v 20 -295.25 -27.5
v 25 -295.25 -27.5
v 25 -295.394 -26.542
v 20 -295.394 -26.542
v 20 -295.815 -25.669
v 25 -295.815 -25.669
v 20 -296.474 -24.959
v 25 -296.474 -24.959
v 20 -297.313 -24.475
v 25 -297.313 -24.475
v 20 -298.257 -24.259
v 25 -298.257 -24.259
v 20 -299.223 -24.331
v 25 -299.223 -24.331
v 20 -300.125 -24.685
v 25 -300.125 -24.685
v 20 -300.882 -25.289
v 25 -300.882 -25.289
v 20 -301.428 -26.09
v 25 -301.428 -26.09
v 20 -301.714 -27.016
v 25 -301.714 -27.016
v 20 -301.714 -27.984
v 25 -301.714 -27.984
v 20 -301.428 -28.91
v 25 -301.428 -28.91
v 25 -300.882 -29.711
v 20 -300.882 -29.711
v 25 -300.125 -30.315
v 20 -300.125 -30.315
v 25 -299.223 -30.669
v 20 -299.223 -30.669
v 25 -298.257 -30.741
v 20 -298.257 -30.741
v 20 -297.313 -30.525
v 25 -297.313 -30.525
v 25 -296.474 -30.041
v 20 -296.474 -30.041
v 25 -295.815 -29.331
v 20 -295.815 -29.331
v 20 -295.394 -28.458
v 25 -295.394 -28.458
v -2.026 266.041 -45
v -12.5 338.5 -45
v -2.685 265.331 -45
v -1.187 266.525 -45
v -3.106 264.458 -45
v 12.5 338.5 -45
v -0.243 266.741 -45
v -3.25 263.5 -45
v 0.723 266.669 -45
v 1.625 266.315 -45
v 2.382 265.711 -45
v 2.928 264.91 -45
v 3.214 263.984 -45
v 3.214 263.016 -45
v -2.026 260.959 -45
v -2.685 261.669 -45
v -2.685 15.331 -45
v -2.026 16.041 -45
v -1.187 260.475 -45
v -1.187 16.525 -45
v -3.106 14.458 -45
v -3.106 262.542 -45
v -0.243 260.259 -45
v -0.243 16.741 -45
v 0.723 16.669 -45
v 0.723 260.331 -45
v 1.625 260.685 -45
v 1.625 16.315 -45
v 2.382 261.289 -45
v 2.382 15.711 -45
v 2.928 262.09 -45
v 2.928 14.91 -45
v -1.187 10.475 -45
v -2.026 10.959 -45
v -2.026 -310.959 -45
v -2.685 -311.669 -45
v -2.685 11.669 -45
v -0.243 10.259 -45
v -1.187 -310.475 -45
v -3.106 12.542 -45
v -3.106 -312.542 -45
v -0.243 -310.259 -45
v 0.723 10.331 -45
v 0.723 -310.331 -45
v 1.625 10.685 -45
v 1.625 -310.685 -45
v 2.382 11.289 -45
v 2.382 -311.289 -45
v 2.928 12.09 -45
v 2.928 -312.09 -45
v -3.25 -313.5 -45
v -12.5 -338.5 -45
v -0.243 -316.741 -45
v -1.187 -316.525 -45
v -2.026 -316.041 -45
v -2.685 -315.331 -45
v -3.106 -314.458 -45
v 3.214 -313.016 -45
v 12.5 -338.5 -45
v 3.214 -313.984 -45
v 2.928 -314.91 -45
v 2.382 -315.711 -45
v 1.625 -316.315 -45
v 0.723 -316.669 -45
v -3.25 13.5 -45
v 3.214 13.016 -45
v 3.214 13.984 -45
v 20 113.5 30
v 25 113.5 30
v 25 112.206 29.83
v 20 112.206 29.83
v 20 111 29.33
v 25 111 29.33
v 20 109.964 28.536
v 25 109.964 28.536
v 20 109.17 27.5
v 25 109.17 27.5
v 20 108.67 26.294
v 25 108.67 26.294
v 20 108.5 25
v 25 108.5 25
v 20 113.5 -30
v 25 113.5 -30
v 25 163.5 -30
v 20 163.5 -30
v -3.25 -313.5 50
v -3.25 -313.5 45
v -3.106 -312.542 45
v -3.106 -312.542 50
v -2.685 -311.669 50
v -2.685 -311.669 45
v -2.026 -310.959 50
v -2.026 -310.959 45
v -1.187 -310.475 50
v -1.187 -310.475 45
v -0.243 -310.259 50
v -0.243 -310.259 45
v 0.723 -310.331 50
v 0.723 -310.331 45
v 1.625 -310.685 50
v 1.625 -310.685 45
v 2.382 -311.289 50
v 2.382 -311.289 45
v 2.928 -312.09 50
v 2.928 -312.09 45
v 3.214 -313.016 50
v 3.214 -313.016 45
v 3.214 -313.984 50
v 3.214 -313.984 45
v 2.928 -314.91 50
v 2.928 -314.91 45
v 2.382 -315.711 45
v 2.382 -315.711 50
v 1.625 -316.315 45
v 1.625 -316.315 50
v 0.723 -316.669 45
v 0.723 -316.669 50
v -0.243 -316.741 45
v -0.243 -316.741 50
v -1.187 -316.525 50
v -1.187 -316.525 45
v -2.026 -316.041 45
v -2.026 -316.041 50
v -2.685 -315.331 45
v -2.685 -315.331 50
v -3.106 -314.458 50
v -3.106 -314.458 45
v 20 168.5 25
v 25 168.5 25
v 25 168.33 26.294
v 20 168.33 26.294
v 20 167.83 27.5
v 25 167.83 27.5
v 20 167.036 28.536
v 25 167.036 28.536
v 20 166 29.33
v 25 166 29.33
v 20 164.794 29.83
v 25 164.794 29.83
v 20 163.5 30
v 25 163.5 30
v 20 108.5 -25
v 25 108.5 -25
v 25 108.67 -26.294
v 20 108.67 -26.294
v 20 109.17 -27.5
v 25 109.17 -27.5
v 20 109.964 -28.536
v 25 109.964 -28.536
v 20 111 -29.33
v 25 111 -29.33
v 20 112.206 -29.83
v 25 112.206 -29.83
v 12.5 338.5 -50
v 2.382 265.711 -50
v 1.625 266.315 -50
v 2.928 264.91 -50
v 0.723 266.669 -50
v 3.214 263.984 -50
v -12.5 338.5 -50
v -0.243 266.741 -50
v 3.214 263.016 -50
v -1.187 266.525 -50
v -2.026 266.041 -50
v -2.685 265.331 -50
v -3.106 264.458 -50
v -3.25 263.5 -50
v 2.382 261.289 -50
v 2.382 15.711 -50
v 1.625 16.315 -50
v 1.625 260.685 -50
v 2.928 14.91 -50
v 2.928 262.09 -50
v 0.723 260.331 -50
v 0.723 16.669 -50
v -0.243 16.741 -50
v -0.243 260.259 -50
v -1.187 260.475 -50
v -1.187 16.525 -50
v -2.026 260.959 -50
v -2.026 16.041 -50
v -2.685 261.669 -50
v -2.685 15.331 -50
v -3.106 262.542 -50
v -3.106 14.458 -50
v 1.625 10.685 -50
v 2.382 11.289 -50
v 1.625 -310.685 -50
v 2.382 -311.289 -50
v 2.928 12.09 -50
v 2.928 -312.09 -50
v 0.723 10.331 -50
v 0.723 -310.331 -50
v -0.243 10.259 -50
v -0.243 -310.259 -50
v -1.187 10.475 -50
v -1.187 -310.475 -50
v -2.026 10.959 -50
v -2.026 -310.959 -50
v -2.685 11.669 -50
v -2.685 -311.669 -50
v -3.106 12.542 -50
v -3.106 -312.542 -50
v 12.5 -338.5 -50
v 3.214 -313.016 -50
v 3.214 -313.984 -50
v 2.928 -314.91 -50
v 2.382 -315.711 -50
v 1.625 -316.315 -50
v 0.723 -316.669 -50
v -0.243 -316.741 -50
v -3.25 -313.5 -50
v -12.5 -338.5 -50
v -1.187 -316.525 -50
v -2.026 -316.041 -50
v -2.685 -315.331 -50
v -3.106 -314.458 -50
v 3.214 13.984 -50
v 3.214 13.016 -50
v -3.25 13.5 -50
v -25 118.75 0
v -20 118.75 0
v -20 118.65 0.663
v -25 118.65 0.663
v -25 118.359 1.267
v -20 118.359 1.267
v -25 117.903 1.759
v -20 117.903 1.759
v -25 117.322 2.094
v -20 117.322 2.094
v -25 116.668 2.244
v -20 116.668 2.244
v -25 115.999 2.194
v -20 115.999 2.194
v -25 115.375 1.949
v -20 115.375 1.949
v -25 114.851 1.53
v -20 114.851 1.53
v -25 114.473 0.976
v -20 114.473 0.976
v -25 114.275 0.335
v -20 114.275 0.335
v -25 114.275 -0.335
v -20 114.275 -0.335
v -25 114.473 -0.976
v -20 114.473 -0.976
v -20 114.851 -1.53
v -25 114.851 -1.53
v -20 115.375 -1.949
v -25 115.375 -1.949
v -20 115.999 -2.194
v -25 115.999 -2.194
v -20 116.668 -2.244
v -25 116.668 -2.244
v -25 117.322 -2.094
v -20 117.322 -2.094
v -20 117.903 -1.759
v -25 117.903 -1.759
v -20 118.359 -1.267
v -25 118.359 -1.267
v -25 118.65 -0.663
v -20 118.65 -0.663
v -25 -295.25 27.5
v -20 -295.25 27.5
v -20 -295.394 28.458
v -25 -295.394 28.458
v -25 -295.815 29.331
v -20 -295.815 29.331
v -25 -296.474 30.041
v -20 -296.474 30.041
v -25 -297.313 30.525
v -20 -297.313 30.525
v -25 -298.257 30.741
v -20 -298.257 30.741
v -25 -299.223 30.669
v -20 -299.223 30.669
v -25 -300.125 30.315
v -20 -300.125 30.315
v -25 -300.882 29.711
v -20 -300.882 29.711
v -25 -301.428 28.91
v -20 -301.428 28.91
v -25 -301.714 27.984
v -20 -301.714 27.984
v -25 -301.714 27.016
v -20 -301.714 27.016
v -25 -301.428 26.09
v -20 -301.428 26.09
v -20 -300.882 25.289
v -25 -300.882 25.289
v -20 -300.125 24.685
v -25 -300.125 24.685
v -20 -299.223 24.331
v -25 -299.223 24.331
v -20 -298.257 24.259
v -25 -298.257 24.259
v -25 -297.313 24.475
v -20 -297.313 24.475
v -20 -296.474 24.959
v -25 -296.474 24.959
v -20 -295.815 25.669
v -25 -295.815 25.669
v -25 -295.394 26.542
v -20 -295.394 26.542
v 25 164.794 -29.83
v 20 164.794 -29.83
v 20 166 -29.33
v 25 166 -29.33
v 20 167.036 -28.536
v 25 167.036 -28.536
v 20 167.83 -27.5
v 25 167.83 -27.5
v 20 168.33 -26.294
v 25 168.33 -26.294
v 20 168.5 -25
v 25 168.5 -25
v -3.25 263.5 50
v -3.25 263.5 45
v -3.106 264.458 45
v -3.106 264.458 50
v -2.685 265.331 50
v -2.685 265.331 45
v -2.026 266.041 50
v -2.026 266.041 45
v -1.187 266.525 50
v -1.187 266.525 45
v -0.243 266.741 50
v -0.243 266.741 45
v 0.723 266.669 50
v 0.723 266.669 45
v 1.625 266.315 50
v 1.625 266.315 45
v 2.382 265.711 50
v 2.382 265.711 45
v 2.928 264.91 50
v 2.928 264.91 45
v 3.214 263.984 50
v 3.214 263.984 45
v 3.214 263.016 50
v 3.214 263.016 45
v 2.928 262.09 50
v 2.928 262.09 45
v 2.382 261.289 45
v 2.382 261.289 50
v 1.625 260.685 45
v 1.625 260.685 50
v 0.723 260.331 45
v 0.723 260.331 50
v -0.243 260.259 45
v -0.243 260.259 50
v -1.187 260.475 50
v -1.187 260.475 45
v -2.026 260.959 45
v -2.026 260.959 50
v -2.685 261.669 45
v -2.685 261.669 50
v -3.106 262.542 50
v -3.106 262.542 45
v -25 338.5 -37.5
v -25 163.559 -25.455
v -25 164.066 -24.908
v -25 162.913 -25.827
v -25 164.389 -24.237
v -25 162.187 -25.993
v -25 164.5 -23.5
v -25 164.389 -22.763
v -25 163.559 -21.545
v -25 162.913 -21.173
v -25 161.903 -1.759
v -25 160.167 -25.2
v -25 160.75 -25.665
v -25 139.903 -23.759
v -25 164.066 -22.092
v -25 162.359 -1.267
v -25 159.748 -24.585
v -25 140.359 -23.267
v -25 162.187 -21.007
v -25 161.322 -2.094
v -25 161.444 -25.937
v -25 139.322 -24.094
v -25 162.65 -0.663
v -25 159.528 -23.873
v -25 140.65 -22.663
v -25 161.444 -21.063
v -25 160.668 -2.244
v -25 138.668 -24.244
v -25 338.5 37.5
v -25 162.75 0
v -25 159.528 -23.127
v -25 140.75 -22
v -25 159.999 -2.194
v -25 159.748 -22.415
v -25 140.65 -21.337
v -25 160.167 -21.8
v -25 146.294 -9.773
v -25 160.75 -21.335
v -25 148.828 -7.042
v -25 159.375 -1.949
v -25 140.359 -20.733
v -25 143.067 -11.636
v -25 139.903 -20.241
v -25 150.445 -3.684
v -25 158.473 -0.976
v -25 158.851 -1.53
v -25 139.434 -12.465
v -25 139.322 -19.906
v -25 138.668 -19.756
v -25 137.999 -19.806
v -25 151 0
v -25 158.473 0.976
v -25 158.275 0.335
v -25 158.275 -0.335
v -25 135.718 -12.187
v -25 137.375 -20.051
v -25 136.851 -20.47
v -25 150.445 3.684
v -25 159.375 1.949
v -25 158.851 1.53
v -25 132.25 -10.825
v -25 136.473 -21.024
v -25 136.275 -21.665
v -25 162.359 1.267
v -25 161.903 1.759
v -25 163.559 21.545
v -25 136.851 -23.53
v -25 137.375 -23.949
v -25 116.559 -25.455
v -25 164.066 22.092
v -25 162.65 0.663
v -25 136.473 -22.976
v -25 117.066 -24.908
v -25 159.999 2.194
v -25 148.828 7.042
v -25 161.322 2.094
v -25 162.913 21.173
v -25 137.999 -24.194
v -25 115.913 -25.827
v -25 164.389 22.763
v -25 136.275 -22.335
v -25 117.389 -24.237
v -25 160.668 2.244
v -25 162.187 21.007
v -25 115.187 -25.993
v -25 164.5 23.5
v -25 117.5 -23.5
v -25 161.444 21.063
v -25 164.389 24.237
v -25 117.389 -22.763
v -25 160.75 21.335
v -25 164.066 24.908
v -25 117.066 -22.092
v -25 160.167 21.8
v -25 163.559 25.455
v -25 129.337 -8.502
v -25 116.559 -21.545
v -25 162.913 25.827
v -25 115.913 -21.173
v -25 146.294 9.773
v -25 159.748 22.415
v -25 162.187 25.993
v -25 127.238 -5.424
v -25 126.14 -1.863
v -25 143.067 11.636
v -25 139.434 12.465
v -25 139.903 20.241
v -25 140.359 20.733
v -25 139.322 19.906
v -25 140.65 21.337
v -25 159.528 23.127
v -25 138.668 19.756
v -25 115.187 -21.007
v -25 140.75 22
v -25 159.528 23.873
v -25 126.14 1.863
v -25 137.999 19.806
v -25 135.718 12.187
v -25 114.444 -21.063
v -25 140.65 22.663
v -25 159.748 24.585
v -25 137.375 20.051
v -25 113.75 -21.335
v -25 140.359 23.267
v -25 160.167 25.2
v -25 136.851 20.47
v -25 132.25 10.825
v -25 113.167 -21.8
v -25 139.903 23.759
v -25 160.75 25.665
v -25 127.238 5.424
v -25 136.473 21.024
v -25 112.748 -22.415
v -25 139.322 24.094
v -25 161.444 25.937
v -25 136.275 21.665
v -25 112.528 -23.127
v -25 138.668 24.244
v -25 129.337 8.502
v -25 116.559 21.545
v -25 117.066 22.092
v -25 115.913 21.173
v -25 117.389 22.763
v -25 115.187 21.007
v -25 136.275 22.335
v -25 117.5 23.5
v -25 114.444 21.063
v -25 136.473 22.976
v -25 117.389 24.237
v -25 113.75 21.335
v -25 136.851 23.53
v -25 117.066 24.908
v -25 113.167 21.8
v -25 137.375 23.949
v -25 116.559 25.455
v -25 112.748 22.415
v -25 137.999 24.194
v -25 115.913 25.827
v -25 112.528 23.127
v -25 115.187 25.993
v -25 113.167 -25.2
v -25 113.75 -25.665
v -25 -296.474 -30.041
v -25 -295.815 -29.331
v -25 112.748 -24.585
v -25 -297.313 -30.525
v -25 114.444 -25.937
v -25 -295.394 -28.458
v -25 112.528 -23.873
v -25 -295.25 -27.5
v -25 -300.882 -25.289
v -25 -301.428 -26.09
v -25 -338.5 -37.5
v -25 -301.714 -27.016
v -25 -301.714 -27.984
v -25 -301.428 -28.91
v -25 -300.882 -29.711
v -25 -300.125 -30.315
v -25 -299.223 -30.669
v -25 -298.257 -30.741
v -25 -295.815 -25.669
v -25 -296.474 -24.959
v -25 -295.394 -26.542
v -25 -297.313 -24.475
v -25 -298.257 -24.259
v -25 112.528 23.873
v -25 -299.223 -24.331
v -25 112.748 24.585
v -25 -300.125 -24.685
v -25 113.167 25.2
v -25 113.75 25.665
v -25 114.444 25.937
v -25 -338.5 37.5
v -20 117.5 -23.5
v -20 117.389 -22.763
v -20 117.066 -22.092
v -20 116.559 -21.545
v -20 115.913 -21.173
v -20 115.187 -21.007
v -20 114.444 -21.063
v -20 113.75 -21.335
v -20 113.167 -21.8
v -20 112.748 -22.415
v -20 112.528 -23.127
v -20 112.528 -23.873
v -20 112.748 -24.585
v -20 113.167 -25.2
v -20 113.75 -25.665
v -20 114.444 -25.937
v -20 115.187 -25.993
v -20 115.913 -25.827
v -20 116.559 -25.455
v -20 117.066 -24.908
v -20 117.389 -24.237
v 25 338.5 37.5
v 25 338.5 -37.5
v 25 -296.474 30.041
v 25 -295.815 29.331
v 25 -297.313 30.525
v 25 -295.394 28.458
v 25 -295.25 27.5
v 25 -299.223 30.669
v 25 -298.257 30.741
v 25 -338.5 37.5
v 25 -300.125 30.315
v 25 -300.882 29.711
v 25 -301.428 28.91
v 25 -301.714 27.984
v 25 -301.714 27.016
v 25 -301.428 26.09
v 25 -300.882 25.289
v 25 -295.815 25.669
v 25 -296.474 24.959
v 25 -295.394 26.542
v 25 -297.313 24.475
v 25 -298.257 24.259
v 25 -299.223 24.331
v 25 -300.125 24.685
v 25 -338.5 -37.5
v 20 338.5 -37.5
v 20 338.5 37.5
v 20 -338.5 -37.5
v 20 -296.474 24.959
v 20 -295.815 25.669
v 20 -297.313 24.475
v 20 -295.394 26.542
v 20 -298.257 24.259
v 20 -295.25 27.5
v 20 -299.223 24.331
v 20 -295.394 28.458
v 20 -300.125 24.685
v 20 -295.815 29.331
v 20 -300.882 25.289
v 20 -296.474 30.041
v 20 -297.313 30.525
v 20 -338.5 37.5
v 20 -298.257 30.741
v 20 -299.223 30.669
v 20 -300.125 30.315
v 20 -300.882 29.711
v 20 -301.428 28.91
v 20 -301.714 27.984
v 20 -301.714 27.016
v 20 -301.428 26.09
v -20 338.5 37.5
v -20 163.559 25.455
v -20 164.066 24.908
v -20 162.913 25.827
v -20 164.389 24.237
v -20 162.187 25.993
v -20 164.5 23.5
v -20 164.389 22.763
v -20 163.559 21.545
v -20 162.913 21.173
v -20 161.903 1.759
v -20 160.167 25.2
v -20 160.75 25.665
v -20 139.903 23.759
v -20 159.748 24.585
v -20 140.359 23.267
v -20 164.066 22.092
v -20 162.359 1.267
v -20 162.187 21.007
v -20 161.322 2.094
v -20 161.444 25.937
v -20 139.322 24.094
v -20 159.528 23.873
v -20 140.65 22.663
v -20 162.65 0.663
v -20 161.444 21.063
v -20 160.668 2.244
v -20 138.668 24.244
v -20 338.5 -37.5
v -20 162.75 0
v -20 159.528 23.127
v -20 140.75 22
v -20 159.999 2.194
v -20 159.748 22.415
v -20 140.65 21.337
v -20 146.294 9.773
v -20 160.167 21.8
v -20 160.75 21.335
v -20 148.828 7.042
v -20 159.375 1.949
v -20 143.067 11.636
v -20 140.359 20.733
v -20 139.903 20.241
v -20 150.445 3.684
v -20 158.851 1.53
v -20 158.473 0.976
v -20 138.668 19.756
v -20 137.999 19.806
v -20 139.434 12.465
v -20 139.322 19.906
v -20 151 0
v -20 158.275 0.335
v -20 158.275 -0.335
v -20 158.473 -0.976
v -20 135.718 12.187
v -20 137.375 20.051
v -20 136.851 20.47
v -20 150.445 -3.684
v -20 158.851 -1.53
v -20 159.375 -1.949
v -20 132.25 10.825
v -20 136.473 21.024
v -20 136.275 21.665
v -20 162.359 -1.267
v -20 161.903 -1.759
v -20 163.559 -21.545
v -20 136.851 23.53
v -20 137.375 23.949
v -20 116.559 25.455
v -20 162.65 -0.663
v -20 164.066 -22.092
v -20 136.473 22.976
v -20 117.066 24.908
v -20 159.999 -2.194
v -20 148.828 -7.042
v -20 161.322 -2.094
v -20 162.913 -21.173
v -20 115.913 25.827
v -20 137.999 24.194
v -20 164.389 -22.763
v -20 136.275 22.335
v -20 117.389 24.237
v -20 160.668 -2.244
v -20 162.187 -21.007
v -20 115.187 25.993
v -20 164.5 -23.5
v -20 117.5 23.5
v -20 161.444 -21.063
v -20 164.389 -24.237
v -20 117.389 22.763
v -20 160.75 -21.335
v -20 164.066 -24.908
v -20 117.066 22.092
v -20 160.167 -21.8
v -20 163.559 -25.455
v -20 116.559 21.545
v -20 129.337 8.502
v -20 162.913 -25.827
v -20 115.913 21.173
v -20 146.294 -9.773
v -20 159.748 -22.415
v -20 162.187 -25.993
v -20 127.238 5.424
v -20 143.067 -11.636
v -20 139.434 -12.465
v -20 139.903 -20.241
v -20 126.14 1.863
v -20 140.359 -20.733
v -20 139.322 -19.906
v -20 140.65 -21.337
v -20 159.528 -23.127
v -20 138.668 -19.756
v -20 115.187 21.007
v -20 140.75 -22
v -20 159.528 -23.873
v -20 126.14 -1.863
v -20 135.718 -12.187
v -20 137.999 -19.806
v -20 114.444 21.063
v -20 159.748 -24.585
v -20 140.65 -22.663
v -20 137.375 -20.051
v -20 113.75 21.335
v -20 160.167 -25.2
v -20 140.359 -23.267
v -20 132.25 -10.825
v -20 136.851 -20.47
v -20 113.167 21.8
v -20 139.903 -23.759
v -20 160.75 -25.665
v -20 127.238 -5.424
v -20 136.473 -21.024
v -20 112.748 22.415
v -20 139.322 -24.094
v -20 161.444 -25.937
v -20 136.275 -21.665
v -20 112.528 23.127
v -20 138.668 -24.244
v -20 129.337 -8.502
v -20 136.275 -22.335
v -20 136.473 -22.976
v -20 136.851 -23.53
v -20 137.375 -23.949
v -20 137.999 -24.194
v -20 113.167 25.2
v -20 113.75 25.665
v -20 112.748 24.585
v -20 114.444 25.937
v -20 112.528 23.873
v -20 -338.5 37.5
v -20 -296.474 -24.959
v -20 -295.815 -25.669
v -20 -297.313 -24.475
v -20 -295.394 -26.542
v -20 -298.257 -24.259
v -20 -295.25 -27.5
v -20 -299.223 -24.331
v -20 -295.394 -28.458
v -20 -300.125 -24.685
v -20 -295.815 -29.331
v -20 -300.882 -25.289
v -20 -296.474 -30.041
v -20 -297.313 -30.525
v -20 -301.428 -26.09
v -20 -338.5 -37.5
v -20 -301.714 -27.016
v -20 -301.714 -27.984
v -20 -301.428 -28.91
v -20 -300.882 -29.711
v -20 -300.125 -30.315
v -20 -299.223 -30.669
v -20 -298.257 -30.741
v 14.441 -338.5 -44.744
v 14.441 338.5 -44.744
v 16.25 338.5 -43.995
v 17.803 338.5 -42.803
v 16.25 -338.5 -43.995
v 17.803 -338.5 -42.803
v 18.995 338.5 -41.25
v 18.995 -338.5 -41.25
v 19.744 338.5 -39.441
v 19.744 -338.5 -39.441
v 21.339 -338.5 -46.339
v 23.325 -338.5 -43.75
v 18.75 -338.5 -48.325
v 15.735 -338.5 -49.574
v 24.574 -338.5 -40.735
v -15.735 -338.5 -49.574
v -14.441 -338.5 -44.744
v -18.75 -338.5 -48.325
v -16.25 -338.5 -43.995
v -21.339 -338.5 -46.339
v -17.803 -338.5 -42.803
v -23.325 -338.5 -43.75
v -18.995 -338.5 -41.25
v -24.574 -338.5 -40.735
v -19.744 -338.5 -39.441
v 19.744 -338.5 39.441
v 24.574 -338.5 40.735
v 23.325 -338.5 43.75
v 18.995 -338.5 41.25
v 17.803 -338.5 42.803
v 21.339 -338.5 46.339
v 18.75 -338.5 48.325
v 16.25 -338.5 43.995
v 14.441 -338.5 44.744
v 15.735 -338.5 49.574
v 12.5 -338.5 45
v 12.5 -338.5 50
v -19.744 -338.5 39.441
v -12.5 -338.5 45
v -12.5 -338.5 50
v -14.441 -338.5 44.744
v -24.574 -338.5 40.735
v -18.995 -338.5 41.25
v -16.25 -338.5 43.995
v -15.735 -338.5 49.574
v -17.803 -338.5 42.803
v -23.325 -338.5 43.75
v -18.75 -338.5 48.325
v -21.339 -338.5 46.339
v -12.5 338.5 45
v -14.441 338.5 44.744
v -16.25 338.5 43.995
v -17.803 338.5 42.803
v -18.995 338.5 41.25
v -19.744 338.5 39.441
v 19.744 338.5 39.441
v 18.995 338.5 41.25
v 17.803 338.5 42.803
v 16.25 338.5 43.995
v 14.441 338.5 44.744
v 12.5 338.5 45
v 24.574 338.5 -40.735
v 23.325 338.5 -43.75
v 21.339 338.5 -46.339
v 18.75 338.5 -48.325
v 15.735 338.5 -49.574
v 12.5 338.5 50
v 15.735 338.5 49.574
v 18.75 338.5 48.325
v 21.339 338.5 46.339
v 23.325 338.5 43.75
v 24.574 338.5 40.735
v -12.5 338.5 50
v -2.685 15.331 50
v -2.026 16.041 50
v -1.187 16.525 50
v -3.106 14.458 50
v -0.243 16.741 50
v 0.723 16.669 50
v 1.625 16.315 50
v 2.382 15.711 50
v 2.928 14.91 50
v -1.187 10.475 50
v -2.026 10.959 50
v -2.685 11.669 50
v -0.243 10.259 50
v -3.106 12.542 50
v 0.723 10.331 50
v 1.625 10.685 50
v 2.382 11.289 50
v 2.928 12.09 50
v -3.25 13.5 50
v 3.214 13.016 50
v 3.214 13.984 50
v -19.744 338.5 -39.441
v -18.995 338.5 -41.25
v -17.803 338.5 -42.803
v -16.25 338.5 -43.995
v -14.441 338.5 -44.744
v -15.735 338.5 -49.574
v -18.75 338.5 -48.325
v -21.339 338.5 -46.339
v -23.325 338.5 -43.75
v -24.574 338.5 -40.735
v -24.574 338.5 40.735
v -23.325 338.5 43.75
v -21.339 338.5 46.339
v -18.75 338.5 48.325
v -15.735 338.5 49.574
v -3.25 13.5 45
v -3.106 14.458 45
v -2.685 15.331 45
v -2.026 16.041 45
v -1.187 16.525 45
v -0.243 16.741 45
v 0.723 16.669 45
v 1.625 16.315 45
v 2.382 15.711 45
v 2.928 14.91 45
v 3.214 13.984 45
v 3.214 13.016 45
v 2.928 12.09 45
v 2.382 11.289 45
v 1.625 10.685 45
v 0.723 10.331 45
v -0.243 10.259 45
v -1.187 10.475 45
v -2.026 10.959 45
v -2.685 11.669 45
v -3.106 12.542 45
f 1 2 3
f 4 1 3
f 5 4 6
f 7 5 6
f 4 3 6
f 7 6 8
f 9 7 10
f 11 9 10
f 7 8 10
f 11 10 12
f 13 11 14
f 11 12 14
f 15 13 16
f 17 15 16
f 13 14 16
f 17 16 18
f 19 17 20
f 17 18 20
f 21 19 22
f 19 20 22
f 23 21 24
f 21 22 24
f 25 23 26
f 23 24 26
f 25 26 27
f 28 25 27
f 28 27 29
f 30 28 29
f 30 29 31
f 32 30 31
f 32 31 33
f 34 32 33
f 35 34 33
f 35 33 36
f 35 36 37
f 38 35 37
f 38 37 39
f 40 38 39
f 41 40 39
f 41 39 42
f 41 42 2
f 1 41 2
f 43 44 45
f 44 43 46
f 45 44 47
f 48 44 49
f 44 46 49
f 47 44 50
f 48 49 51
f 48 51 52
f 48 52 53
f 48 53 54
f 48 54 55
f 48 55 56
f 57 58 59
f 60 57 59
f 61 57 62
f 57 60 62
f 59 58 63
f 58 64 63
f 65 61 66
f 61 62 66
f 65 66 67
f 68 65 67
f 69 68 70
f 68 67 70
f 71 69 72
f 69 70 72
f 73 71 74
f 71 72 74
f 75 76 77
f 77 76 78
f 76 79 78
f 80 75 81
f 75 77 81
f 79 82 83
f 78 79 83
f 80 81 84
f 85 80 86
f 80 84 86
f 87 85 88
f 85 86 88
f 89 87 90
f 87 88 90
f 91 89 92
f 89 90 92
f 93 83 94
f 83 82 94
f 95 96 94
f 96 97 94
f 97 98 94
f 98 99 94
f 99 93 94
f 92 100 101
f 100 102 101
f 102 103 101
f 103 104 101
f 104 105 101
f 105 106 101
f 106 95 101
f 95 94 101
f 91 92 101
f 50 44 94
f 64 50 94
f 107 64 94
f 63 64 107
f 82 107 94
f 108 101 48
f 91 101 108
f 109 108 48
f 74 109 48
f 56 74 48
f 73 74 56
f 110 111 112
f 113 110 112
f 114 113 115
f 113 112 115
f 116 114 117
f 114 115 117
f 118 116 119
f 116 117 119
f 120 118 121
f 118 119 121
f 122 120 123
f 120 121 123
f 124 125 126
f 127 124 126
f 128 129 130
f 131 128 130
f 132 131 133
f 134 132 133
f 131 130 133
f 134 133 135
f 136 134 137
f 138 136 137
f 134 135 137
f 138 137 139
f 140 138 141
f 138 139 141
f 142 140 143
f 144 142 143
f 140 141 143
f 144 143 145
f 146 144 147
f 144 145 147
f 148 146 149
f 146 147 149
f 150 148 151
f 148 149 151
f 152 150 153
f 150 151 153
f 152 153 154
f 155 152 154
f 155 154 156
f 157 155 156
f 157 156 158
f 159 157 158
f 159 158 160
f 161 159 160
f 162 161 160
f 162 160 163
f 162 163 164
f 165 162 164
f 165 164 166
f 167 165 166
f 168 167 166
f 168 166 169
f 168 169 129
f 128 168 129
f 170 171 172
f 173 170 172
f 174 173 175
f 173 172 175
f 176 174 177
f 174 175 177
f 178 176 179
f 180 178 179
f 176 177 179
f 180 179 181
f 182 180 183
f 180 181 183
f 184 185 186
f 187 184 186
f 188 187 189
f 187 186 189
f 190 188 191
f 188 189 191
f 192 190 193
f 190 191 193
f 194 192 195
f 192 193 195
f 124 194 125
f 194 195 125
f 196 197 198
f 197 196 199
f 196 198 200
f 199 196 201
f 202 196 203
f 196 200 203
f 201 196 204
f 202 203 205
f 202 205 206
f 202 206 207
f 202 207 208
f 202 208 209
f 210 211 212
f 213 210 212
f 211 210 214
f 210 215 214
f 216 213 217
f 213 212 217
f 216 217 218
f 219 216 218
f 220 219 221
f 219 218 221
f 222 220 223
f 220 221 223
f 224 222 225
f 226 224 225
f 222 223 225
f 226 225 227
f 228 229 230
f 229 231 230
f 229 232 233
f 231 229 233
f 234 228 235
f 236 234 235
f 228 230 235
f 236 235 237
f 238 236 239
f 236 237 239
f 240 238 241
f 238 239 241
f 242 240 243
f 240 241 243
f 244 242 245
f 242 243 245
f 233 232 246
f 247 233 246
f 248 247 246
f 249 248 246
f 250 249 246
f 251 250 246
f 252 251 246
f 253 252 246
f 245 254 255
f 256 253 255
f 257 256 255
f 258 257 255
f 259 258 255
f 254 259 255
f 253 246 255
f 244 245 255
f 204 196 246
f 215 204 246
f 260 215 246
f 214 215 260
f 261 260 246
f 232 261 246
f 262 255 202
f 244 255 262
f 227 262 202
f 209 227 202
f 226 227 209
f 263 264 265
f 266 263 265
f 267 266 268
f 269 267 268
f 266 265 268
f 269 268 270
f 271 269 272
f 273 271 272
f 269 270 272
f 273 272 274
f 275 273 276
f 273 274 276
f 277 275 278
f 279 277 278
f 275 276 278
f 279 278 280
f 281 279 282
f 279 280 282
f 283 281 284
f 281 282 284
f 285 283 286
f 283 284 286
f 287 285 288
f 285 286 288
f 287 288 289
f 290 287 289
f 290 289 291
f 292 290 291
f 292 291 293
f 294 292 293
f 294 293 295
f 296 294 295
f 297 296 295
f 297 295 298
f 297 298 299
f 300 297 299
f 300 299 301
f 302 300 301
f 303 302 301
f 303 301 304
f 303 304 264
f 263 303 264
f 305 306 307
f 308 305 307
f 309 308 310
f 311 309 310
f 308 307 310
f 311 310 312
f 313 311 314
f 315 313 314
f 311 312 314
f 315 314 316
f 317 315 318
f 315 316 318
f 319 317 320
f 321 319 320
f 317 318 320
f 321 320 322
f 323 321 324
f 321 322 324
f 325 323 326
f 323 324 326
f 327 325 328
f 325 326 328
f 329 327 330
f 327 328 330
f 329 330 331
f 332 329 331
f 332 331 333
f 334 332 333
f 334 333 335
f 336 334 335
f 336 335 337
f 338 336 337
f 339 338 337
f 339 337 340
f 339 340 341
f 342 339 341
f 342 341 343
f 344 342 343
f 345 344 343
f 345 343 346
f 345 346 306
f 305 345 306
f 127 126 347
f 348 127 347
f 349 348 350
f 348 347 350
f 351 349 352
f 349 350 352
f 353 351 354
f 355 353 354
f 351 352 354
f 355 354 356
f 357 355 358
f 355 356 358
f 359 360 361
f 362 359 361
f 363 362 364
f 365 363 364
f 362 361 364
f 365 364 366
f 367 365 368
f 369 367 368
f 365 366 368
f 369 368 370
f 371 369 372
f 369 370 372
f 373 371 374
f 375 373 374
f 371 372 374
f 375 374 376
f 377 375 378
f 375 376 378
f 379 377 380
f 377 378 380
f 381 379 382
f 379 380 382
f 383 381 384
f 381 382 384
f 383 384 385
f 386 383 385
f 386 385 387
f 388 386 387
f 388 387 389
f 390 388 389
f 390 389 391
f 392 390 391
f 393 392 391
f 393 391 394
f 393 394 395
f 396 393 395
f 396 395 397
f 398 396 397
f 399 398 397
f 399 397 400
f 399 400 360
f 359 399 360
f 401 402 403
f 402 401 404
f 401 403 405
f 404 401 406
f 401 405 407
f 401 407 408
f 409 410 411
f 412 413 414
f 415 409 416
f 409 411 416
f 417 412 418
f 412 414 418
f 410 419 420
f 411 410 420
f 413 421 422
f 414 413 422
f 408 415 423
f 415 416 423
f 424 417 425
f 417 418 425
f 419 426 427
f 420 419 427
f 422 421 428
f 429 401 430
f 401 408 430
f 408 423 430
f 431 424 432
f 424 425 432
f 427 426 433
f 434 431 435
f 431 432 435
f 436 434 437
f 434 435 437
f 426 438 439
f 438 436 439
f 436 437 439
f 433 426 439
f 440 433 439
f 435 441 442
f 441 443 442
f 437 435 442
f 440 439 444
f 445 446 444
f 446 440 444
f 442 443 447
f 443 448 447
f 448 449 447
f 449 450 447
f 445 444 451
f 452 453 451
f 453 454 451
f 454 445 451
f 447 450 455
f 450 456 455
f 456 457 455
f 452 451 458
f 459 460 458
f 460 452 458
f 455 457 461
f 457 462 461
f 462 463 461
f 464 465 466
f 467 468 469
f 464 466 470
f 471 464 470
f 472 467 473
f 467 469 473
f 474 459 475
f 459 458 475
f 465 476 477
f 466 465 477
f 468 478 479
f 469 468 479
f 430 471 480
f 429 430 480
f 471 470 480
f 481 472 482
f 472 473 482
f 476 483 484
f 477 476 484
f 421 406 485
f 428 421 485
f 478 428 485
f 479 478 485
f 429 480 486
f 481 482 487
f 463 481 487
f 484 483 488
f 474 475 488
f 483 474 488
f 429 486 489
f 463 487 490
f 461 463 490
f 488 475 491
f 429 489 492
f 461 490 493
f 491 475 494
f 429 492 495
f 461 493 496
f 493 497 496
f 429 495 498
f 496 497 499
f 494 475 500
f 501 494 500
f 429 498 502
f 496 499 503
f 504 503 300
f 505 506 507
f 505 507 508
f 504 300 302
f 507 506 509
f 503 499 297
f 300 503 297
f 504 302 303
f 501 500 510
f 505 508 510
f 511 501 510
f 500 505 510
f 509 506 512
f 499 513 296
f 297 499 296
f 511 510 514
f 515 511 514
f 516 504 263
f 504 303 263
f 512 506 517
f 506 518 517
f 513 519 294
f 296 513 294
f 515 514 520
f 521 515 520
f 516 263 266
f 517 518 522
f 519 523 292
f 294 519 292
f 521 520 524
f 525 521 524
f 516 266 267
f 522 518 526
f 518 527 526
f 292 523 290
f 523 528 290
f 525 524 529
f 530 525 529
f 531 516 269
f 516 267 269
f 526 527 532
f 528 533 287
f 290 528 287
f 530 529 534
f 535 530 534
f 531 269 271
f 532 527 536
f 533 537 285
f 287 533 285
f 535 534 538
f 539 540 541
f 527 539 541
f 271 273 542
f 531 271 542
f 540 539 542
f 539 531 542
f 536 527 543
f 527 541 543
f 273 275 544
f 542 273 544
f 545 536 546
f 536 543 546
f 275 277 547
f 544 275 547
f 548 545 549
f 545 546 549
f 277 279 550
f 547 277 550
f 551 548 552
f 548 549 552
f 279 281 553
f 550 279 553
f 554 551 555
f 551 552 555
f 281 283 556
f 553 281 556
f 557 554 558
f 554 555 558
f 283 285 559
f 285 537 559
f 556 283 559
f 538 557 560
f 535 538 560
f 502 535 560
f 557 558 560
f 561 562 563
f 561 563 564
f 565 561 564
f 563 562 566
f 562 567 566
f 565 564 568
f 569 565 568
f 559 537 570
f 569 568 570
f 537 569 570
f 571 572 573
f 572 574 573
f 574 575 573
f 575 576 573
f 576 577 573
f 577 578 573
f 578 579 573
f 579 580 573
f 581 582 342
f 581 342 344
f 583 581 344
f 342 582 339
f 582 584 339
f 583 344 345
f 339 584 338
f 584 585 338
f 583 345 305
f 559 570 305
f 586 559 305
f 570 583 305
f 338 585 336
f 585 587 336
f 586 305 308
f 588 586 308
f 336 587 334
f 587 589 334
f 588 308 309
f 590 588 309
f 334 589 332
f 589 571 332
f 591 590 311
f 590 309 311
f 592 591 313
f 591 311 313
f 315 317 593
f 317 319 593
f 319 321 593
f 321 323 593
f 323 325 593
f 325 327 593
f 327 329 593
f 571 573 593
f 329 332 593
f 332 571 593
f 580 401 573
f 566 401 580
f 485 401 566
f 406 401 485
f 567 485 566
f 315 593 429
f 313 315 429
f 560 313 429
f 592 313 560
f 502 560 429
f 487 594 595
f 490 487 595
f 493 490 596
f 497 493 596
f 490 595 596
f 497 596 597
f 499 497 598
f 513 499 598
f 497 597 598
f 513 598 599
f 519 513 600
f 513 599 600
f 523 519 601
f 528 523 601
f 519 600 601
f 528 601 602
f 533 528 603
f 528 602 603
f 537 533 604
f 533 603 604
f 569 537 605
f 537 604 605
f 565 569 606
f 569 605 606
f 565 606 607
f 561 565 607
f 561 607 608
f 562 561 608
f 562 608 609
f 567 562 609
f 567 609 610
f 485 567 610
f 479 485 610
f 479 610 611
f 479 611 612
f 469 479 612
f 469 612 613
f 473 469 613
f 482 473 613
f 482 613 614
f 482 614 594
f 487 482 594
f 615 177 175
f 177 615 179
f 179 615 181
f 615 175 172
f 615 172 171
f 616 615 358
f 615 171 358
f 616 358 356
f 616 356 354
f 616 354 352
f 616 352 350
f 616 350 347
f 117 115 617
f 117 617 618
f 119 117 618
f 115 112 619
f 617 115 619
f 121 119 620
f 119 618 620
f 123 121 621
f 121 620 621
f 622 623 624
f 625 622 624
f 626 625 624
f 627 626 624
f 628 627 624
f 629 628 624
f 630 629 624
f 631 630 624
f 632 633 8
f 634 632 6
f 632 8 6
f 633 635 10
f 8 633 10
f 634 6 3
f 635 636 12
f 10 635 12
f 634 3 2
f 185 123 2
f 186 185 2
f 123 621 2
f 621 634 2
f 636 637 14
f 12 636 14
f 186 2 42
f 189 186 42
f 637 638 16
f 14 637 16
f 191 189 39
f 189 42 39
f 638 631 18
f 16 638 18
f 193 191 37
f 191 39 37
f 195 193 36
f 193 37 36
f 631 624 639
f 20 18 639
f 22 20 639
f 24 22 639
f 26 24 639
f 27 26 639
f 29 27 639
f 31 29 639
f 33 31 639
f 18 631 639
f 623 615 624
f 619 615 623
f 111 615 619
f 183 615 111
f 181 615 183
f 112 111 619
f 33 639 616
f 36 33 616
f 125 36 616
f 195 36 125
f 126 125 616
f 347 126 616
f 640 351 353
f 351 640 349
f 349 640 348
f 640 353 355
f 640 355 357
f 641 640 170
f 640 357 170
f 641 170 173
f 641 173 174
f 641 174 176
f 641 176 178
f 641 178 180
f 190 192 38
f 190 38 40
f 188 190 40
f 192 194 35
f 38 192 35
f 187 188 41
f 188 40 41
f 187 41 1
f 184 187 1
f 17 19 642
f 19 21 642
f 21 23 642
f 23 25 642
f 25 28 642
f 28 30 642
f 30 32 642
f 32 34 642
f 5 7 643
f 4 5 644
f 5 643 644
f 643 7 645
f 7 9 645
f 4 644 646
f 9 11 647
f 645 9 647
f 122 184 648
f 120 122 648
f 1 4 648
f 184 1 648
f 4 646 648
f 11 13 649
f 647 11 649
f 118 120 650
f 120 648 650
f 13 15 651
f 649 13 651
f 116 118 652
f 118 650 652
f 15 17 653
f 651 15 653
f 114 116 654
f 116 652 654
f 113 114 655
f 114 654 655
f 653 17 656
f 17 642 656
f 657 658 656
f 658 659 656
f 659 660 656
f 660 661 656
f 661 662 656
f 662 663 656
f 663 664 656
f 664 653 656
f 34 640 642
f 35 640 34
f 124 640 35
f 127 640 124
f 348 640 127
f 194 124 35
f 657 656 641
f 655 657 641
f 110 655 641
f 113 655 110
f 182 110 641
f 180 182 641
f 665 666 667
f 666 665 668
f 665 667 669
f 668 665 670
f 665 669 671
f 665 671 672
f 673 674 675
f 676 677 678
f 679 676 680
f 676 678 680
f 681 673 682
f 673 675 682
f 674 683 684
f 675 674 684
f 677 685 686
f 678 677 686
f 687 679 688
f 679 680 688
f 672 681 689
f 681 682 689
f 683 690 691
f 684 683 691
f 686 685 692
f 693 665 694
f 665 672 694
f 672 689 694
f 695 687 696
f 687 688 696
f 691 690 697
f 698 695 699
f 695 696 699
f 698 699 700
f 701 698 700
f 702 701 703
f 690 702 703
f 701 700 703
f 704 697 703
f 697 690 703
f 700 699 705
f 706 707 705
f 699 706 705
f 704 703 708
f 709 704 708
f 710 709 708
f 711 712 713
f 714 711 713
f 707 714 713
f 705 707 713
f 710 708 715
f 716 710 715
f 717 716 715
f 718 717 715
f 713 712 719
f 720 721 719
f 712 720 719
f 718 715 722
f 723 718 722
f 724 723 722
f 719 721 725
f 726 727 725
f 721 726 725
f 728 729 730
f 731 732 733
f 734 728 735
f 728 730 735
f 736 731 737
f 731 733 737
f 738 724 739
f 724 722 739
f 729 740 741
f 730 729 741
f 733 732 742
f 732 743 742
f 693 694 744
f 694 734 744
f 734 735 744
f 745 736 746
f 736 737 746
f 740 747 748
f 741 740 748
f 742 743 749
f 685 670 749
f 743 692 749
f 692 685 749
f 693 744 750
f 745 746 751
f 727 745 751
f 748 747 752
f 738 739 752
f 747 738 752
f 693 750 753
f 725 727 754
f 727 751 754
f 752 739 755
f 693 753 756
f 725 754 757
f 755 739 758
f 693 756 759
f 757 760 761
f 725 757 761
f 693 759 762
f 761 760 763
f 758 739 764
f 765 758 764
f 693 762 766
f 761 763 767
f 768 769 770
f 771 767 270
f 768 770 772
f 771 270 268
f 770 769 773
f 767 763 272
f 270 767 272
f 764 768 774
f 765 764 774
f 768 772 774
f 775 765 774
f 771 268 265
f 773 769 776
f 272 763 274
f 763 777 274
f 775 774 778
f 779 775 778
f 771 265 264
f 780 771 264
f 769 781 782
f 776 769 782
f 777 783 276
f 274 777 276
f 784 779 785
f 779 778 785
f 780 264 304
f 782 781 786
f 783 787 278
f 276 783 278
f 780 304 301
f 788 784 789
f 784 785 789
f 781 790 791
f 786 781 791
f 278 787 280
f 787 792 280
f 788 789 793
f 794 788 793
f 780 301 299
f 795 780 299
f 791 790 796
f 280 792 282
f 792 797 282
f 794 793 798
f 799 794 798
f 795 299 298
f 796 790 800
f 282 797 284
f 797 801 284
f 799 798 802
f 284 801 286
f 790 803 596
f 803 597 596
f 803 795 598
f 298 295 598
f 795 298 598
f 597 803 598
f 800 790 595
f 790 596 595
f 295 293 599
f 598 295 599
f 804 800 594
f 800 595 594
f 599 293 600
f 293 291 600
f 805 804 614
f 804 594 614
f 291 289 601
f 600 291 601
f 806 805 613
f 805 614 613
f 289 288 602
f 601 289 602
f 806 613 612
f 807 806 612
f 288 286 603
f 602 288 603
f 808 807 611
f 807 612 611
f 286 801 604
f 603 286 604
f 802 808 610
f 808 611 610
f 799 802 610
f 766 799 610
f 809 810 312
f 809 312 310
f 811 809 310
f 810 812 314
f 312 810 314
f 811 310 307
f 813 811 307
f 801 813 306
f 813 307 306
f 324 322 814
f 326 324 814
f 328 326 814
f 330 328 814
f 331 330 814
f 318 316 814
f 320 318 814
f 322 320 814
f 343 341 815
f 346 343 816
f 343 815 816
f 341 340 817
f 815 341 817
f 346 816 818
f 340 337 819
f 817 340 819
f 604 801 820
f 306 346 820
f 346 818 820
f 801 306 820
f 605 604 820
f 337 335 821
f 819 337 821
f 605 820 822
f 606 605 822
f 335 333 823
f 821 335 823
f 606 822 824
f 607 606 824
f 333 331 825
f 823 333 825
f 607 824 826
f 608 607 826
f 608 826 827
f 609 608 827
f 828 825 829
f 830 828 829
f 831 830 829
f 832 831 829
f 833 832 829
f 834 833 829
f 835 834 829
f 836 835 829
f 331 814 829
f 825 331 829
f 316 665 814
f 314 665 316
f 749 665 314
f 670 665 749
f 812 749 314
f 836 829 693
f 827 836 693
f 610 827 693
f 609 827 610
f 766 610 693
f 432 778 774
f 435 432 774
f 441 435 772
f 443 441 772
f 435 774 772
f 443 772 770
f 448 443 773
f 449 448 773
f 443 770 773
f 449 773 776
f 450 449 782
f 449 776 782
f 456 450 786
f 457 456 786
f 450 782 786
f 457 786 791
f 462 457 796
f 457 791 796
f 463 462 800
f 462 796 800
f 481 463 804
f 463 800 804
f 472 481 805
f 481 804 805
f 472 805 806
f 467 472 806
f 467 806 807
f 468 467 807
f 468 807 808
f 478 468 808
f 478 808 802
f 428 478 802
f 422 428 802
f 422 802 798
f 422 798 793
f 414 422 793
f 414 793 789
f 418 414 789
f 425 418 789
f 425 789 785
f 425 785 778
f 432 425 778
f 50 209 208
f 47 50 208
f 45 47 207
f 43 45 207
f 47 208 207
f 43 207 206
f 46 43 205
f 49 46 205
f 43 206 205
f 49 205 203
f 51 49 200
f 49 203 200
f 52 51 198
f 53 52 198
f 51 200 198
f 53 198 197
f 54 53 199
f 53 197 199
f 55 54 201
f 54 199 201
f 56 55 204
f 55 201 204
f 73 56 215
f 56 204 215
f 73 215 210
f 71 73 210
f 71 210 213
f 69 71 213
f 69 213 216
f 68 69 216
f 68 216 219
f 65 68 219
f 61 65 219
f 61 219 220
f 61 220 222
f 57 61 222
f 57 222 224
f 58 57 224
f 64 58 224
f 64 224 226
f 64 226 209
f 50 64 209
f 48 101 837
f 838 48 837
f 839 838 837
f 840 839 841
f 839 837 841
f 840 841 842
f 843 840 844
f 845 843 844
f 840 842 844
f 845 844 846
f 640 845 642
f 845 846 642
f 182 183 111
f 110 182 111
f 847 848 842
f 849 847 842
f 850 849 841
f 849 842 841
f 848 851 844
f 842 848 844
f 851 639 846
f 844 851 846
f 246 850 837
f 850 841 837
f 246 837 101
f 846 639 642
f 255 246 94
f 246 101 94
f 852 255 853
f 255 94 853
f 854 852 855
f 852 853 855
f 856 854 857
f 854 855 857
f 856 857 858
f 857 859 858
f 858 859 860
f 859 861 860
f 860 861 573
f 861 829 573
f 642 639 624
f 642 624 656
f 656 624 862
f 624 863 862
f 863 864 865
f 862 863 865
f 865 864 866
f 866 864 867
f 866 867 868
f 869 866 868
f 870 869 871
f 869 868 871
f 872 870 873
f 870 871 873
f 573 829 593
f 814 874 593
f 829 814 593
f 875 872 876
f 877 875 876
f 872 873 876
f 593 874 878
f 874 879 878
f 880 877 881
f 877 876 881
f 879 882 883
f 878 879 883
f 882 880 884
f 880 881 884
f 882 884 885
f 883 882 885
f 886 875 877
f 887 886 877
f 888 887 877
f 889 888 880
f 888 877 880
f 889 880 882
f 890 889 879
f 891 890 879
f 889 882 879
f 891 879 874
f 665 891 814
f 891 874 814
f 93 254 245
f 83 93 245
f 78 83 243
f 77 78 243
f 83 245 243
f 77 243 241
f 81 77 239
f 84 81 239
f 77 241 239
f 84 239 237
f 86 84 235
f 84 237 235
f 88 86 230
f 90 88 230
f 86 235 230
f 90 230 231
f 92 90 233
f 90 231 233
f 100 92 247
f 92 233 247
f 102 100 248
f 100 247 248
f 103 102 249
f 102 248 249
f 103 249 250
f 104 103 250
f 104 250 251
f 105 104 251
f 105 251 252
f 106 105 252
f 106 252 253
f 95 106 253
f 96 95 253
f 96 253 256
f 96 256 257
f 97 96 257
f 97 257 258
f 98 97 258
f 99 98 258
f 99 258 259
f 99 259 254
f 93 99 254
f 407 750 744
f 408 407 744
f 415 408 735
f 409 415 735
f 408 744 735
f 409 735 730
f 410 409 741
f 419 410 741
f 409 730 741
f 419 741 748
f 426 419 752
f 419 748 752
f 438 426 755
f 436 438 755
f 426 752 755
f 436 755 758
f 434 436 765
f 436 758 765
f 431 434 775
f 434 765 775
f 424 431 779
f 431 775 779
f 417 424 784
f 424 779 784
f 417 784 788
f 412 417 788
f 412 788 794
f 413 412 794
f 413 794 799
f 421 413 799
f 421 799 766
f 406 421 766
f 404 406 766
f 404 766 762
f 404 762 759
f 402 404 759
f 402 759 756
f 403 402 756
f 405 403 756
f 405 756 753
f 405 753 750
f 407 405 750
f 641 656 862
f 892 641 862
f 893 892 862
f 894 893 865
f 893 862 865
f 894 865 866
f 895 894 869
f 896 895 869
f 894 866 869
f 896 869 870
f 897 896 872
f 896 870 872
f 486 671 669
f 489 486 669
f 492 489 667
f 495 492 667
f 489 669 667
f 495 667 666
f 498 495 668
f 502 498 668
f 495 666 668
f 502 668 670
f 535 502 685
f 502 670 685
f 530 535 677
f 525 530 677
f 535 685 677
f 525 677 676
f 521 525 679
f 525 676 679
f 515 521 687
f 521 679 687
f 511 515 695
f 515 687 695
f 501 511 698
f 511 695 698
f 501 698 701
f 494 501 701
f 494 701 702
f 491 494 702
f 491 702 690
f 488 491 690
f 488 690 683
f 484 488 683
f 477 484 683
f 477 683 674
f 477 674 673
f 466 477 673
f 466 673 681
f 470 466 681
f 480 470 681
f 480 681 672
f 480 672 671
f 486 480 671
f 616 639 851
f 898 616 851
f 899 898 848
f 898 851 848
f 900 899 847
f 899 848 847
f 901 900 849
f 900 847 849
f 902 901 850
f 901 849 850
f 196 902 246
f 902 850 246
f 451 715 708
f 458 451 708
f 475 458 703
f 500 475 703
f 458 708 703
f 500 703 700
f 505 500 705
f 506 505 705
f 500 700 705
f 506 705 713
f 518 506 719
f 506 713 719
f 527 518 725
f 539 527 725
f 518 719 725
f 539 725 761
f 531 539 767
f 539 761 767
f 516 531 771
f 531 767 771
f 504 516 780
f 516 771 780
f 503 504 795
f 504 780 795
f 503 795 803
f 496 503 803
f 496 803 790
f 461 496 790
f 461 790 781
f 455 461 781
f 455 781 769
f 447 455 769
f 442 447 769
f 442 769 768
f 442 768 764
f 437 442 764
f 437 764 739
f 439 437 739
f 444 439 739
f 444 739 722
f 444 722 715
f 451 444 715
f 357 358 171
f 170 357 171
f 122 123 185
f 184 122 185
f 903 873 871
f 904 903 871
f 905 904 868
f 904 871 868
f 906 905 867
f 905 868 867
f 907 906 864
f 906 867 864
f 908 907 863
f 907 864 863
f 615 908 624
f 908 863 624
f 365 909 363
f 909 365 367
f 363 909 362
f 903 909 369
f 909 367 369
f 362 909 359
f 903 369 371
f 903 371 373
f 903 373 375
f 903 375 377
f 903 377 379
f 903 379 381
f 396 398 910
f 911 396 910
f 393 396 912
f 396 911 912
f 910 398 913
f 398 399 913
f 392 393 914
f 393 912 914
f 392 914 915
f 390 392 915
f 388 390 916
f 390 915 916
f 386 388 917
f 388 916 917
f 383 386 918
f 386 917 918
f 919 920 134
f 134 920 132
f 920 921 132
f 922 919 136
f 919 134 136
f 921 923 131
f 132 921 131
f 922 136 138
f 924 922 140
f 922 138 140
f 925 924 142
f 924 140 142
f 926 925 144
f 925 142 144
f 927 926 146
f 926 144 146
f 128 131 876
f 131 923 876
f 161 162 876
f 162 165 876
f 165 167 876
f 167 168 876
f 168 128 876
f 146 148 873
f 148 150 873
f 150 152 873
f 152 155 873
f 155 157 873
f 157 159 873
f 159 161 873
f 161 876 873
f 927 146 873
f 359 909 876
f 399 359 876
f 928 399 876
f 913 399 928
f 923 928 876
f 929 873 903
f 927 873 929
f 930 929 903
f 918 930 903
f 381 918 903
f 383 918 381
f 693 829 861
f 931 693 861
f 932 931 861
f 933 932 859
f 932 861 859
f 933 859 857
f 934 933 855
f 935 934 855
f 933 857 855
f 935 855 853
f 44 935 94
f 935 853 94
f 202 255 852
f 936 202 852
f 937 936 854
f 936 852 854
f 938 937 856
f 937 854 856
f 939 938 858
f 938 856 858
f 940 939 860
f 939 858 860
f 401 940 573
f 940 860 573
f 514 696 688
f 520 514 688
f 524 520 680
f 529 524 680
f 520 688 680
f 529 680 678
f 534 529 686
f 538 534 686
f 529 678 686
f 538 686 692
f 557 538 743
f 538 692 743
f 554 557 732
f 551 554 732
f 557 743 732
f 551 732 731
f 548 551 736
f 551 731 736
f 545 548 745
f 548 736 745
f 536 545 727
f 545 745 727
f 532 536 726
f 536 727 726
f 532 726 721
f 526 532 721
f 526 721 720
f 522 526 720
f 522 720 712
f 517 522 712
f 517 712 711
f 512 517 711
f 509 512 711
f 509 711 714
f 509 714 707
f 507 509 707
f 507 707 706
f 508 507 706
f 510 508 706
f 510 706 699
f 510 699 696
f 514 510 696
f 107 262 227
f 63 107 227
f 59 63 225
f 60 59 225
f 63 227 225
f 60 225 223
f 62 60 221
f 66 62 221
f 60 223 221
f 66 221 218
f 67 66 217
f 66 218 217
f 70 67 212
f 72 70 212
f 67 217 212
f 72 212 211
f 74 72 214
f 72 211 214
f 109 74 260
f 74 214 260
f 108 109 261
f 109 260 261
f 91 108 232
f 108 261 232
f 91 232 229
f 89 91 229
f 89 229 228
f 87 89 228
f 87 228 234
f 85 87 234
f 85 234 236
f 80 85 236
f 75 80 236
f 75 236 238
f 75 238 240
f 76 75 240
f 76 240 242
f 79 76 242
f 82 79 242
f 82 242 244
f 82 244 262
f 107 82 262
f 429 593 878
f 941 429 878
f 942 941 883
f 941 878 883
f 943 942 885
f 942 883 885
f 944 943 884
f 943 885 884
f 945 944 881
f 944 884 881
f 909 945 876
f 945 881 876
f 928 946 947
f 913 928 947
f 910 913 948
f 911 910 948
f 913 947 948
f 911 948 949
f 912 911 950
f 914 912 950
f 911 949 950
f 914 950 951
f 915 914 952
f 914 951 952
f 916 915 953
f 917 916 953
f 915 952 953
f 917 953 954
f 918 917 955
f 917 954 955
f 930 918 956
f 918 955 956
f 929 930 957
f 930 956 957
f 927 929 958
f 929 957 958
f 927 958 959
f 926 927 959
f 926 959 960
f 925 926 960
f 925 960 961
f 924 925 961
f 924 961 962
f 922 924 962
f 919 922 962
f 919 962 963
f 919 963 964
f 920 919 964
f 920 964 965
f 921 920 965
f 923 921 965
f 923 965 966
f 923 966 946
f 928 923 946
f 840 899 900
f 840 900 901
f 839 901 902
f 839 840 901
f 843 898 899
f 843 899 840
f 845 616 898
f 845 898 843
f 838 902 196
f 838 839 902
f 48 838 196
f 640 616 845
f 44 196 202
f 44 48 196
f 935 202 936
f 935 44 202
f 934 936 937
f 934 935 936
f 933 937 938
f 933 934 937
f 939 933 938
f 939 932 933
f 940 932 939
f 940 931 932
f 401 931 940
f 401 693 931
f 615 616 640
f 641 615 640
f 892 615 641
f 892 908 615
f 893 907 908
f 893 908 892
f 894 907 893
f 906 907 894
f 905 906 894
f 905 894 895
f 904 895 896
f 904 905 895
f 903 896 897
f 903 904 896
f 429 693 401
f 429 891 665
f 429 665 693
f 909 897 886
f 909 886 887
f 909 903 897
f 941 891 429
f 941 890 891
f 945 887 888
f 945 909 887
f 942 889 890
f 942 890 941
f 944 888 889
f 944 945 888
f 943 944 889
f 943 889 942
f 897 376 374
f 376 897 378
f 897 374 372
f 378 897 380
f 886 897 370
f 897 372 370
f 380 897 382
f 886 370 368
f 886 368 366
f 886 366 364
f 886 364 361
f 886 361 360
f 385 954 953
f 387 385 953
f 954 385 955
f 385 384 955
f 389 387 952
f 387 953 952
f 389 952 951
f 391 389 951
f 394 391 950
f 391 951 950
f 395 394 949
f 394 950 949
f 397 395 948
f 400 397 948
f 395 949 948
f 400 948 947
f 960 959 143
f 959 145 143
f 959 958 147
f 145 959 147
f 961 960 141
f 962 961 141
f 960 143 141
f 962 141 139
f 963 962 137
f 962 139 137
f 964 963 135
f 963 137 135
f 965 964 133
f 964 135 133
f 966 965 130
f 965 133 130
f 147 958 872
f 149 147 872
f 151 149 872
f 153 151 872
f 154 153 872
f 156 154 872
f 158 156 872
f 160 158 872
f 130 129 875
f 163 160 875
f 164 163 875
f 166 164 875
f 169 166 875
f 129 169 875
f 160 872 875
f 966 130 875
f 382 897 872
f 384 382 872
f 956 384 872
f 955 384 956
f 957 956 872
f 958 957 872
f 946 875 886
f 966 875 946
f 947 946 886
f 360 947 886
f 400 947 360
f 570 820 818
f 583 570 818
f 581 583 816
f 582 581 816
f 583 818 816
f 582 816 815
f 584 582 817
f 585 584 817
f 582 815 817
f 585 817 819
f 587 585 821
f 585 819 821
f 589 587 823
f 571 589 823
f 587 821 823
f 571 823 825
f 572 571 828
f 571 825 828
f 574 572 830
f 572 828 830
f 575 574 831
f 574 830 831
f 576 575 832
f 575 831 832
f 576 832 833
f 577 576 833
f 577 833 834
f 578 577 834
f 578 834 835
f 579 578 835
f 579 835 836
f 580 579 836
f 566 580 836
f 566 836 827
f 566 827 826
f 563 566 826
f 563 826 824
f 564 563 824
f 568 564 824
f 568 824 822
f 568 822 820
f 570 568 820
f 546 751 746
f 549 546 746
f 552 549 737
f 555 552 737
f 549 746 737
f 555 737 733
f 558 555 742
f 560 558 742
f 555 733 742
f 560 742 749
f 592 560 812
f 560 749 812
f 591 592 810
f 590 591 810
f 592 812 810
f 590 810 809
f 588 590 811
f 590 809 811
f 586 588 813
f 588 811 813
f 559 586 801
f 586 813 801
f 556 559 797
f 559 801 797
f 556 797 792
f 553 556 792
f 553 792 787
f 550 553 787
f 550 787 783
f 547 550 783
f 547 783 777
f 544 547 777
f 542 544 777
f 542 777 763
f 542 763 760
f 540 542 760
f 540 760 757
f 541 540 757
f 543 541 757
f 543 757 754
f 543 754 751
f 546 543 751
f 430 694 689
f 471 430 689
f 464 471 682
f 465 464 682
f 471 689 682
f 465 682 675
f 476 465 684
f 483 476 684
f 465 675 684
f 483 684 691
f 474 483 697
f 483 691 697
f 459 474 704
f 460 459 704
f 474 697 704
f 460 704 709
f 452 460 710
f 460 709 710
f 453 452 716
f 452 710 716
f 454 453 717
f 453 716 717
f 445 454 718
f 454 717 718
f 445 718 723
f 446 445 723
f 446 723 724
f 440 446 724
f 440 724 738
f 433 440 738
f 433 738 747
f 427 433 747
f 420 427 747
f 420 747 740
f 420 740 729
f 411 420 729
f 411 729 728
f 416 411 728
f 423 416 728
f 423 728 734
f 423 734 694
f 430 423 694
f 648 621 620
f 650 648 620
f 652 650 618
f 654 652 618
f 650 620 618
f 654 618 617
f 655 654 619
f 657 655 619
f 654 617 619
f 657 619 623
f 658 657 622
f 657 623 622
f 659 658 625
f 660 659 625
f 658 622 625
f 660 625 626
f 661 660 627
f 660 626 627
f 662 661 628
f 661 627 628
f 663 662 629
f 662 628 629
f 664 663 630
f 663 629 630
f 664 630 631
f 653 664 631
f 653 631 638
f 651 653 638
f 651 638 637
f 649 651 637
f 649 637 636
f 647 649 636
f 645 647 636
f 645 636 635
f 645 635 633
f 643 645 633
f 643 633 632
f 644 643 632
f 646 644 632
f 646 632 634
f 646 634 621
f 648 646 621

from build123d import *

# Parameters (mm, degrees)
RHS_C350_AS_100X50X5_0_RHS_C350_1_DEPTH = 677
SKETCH12_R                              = 2.25
CUT_EXTRUDE1_DEPTH                      = 10
CUT_EXTRUDE2_DEPTH                      = 10
SKETCH17_R                              = 12.5
SKETCH17_R_2                            = 2.5
CUT_EXTRUDE3_DEPTH                      = 10
SKETCH18_R                              = 3.25
CUT_EXTRUDE4_DEPTH                      = 354.846364966
SKETCH19_R                              = 3.25
CUT_EXTRUDE5_DEPTH                      = 354.846364966
SKETCH20_R                              = 3.25
CUT_EXTRUDE6_DEPTH                      = 346.806665638
SKETCH21_R                              = 2.25
CUT_EXTRUDE7_DEPTH                      = 10


with BuildPart() as part:
    # Sketch11 → Rhs c350 as 100X50X5.0 RHS C350(1) (new body)
    with BuildSketch(Plane(origin=(0, -338.5, 0), x_dir=(-1, 0, 0), z_dir=(0, 1, 0))):
        with BuildLine():
            Line((-12.5, -50), (12.5, -50))
            ThreePointArc((12.5, -50), (21.338834765, -46.338834765), (25, -37.5))
            Line((25, -37.5), (25, 37.5))
            ThreePointArc((25, 37.5), (21.338834765, 46.338834765), (12.5, 50))
            Line((12.5, 50), (-12.5, 50))
            ThreePointArc((-12.5, 50), (-21.338834765, 46.338834765), (-25, 37.5))
            Line((-25, 37.5), (-25, -37.5))
            ThreePointArc((-25, -37.5), (-21.338834765, -46.338834765), (-12.5, -50))
        make_face()
        with BuildLine():
            Line((-12.5, 45), (12.5, 45))
            ThreePointArc((12.5, 45), (17.803300859, 42.803300859), (20, 37.5))
            Line((20, 37.5), (20, -37.5))
            ThreePointArc((20, -37.5), (17.803300859, -42.803300859), (12.5, -45))
            Line((12.5, -45), (-12.5, -45))
            ThreePointArc((-12.5, -45), (-17.803300859, -42.803300859), (-20, -37.5))
            Line((-20, -37.5), (-20, 37.5))
            ThreePointArc((-20, 37.5), (-17.803300859, 42.803300859), (-12.5, 45))
        make_face(mode=Mode.SUBTRACT)
    extrude(amount=RHS_C350_AS_100X50X5_0_RHS_C350_1_DEPTH)

    # Sketch12 → Cut-Extrude1 (cut)
    with BuildSketch(Plane(origin=(25, 0, 0), x_dir=(0, 0, -1), z_dir=(1, 0, 0))):
        with Locations(Location((14.849242405, 153.349242405, 0), (0, 0, 90))):
            Circle(SKETCH12_R)
        with Locations(Location((-14.849242405, 153.349242405, 0), (0, 0, 90))):
            Circle(SKETCH12_R)
        with Locations(Location((-14.849242405, 123.650757595, 0), (0, 0, 90))):
            Circle(SKETCH12_R)
        with Locations(Location((14.849242405, 123.650757595, 0), (0, 0, 90))):
            Circle(SKETCH12_R)
    extrude(amount=-CUT_EXTRUDE1_DEPTH, mode=Mode.SUBTRACT)

    # Sketch16 → Cut-Extrude2 (cut)
    with BuildSketch(Plane(origin=(25, 0, 0), x_dir=(0, 0, -1), z_dir=(1, 0, 0))):
        with BuildLine():
            Line((-25, 108.5), (25, 108.5))
            ThreePointArc((25, 108.5), (28.535533906, 109.964466094), (30, 113.5))
            Line((30, 113.5), (30, 163.5))
            ThreePointArc((30, 163.5), (28.535533906, 167.035533906), (25, 168.5))
            Line((25, 168.5), (-25, 168.5))
            ThreePointArc((-25, 168.5), (-28.535533906, 167.035533906), (-30, 163.5))
            Line((-30, 163.5), (-30, 113.5))
            ThreePointArc((-30, 113.5), (-28.535533906, 109.964466094), (-25, 108.5))
        make_face()
    extrude(amount=-CUT_EXTRUDE2_DEPTH, mode=Mode.SUBTRACT)

    # Sketch17 → Cut-Extrude3 (cut)
    with BuildSketch(Plane(origin=(-20, 0, 0), x_dir=(0, 0, -1), z_dir=(1, 0, 0))):
        with Locations(Location((0, 138.5, 0), (0, 0, 90))):
            Circle(SKETCH17_R)
        with Locations(Location((-23.5, 162, 0), (0, 0, 90))):
            Circle(SKETCH17_R_2)
        with Locations(Location((23.5, 162, 0), (0, 0, 90))):
            Circle(SKETCH17_R_2)
        with Locations(Location((-23.5, 115, 0), (0, 0, 90))):
            Circle(SKETCH17_R_2)
        with Locations(Location((23.5, 115, 0), (0, 0, 90))):
            Circle(SKETCH17_R_2)
    extrude(amount=-CUT_EXTRUDE3_DEPTH, mode=Mode.SUBTRACT)

    # Sketch18 → Cut-Extrude4 (cut, through all)
    with BuildSketch(Plane(origin=(0, 0, -50), x_dir=(-1, 0, 0), z_dir=(0, 0, -1))):
        with Locations((0, 263.5)):
            Circle(SKETCH18_R)
        with Locations((0, 13.5)):
            Circle(SKETCH18_R)
    extrude(amount=-CUT_EXTRUDE4_DEPTH, mode=Mode.SUBTRACT)

    # Sketch19 → Cut-Extrude5 (cut, through all)
    with BuildSketch(Plane(origin=(0, 0, -50), x_dir=(-1, 0, 0), z_dir=(0, 0, -1))):
        with Locations((0, -313.5)):
            Circle(SKETCH19_R)
    extrude(amount=-CUT_EXTRUDE5_DEPTH, mode=Mode.SUBTRACT)

    # Sketch20 → Cut-Extrude6 (cut, through all)
    with BuildSketch(Plane(origin=(25, 0, 0), x_dir=(0, 0, -1), z_dir=(1, 0, 0))):
        with Locations(Location((27.5, -298.5, 0), (0, 0, 90))):
            Circle(SKETCH20_R)
        with Locations(Location((-27.5, -298.5, 0), (0, 0, 90))):
            Circle(SKETCH20_R)
    extrude(amount=-CUT_EXTRUDE6_DEPTH, mode=Mode.SUBTRACT)

    # Sketch21 → Cut-Extrude7 (cut)
    with BuildSketch(Plane(origin=(-20, 0, 0), x_dir=(0, 0, -1), z_dir=(1, 0, 0))):
        with Locations(Location((0, 160.5, 0), (0, 0, 90))):
            Circle(SKETCH21_R)
        with Locations(Location((22, 138.5, 0), (0, 0, 90))):
            Circle(SKETCH21_R)
        with Locations(Location((0, 116.5, 0), (0, 0, 90))):
            Circle(SKETCH21_R)
        with Locations(Location((-22, 138.5, 0), (0, 0, 90))):
            Circle(SKETCH21_R)
    extrude(amount=-CUT_EXTRUDE7_DEPTH, mode=Mode.SUBTRACT)


solid = part.part
